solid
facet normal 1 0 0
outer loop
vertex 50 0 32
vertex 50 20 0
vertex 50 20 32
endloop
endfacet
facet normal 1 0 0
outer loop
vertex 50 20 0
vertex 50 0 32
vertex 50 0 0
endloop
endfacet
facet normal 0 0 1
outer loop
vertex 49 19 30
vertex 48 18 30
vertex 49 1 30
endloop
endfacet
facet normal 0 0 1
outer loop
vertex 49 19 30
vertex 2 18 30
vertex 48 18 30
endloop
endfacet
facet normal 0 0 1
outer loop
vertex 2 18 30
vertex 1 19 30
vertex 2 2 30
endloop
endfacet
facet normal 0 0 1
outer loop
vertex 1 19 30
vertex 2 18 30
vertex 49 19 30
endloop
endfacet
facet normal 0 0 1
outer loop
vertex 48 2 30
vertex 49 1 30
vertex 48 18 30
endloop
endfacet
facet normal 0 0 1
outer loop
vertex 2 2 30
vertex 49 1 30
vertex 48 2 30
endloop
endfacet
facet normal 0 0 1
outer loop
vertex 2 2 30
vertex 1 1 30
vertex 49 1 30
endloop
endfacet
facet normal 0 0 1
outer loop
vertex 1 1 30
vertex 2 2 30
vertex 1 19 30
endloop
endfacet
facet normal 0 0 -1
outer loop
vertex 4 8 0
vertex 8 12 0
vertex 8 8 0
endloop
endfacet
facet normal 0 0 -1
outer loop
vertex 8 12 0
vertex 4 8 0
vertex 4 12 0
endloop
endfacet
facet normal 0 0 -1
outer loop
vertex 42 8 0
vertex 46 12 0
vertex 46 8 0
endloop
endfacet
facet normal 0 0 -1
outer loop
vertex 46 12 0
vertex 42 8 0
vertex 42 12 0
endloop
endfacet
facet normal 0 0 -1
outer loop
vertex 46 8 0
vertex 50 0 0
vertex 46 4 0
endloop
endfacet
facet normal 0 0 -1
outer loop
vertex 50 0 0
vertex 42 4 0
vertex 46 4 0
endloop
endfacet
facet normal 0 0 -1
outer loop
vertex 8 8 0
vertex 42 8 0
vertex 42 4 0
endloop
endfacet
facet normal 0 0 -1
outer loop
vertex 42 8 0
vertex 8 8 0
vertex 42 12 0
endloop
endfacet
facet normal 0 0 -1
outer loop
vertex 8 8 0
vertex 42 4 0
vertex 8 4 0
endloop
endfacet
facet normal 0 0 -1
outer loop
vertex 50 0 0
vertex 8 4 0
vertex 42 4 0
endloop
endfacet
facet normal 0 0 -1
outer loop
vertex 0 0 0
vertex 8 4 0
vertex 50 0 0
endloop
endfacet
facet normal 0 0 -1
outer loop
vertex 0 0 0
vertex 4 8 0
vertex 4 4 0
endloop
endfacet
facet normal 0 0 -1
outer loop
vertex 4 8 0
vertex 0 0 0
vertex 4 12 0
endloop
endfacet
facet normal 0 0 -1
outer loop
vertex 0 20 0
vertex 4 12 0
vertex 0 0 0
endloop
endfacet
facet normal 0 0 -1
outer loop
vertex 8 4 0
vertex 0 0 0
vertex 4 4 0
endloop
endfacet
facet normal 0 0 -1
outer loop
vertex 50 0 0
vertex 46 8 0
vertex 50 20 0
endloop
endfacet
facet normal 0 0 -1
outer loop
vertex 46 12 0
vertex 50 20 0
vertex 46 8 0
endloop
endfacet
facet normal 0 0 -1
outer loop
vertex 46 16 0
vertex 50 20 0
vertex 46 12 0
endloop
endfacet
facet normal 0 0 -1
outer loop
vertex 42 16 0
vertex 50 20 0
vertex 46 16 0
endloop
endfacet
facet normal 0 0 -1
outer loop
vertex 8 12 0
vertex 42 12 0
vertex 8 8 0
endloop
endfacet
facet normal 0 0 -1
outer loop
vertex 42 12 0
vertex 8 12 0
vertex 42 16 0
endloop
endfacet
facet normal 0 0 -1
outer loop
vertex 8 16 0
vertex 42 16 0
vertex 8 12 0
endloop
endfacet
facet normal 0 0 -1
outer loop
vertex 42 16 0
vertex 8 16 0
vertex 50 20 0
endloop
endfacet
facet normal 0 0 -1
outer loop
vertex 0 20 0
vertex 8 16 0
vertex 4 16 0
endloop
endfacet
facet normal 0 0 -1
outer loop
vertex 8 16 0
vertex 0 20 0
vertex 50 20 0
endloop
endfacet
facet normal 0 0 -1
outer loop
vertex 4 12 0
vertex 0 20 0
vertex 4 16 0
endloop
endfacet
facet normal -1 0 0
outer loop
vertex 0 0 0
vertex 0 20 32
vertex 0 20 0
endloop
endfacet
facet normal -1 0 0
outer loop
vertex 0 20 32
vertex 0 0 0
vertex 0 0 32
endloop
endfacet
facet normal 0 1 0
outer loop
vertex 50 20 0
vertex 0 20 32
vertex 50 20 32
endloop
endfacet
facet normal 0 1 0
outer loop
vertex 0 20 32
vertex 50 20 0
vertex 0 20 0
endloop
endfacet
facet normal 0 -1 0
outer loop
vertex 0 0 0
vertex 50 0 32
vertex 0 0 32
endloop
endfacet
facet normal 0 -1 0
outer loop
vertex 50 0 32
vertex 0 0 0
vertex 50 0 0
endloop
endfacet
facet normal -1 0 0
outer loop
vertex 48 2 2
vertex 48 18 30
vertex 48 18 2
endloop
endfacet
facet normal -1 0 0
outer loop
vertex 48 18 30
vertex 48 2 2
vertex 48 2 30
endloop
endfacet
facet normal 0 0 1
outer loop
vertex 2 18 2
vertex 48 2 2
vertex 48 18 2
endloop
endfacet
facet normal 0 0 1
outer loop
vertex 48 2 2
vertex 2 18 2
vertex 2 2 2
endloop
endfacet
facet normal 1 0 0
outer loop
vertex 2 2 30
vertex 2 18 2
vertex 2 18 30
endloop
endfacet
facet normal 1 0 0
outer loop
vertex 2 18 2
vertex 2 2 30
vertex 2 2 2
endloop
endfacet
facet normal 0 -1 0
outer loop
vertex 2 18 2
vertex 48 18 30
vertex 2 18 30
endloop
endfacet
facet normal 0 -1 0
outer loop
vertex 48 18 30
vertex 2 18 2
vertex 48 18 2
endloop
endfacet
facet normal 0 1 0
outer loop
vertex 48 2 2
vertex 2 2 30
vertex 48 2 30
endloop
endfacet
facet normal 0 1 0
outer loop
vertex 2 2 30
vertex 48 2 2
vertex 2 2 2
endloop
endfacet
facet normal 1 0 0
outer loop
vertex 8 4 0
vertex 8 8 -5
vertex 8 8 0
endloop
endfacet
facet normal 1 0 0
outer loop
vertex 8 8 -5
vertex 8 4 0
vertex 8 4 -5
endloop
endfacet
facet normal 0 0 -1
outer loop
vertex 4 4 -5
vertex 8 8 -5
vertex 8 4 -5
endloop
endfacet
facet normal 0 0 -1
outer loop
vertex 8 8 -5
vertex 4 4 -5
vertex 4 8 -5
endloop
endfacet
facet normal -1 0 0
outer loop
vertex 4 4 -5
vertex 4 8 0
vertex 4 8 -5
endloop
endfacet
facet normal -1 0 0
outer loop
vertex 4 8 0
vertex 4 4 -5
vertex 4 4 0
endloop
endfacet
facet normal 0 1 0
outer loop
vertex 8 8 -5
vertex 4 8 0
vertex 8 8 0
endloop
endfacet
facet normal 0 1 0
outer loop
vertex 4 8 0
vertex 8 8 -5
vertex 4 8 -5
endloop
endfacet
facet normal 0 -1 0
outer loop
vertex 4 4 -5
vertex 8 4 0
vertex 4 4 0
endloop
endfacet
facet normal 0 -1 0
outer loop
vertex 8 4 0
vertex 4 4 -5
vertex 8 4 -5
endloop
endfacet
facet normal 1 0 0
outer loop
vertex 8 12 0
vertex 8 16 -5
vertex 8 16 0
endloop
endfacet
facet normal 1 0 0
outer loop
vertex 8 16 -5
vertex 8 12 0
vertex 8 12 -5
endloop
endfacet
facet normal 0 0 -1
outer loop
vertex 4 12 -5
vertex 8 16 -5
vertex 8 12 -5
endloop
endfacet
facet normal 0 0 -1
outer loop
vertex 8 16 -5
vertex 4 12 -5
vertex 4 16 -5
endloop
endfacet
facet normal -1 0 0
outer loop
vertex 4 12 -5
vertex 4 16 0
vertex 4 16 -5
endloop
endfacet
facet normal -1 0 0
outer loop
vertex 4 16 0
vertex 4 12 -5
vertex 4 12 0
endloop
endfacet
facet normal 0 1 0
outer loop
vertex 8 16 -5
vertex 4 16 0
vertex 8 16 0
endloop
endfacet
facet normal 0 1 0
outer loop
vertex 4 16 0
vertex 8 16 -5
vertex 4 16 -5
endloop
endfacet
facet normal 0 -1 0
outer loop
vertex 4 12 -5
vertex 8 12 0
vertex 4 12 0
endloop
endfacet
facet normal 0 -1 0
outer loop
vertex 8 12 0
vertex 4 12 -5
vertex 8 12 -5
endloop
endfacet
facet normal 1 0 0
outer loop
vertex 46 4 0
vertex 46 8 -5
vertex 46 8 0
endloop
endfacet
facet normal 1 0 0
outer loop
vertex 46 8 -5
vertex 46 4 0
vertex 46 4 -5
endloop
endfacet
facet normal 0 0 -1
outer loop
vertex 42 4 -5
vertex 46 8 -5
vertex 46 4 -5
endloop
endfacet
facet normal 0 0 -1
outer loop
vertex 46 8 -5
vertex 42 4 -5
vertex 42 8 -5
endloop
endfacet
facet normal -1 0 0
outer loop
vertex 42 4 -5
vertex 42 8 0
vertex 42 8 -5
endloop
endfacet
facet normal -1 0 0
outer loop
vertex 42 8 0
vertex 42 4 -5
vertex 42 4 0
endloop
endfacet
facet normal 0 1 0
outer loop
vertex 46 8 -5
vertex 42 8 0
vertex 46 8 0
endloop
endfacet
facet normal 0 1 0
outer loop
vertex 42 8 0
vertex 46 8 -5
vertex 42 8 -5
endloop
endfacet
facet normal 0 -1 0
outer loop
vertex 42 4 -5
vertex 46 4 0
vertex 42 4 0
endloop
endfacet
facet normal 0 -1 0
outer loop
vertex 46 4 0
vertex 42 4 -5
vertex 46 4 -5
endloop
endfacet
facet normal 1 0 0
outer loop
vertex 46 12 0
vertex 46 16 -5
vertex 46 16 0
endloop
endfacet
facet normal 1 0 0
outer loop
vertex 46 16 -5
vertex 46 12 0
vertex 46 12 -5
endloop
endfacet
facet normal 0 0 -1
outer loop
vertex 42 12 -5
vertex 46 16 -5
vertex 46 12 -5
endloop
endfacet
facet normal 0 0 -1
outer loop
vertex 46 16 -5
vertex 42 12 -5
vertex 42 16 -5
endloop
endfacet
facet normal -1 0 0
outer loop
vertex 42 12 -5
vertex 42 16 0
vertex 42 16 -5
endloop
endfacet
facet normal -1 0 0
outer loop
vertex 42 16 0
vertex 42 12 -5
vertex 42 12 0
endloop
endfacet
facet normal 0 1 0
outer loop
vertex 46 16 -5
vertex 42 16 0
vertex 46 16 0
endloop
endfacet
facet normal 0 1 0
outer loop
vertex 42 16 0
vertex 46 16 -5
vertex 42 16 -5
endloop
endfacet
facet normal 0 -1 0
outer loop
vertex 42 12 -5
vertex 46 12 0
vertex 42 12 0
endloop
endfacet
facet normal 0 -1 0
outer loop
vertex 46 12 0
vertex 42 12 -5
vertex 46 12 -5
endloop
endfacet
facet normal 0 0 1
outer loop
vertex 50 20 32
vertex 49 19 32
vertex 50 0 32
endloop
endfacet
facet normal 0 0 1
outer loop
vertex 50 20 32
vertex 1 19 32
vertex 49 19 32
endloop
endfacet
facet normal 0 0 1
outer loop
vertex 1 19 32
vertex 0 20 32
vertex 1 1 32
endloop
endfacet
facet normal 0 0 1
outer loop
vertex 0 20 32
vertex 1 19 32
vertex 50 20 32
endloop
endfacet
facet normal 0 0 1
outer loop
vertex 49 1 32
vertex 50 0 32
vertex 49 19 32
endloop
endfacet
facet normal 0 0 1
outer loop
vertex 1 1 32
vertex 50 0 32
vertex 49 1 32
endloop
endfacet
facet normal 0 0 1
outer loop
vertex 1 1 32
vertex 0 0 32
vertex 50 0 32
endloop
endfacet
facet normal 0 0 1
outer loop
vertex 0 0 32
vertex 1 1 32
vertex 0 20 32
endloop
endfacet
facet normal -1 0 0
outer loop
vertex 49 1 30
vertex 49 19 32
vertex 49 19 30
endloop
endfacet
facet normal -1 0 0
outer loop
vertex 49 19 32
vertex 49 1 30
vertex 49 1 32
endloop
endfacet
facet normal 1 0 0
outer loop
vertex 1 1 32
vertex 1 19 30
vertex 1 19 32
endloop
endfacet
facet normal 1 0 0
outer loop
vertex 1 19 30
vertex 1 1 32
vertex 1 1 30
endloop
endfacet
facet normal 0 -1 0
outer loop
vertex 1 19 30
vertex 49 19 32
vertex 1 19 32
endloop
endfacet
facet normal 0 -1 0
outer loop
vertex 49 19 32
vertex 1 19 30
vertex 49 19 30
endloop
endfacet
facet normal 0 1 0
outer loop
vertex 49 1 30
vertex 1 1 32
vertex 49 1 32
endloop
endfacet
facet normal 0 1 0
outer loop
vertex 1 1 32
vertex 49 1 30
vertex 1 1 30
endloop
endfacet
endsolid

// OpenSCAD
// Colored Box Example
// Demonstrates color parameter support in OpenSCAD Assistive Forge

/* [Dimensions] */
width = 50; // [10:100] Box width (mm)
height = 30; // [10:100] Box height (mm)
depth = 20; // [10:100] Box depth (mm)
wall_thickness = 2; // [1:0.5:5] Wall thickness (mm)

/* [Appearance] */
box_color = "FF6B35"; // [color] Primary box color
accent_color = "004E89"; // [color] Accent color for details
use_colors = "yes"; // [yes, no] Use colors in preview

/* [Details] */
add_lid = "yes"; // [yes, no] Add a lid
add_feet = "yes"; // [yes, no] Add feet to bottom

// Module: Colored Box
// This demonstrates how color parameters work in OpenSCAD Assistive Forge
// Colors are passed as RGB arrays [r, g, b] with values 0-255

module colored_box() {
    difference() {
        // Outer box
        if (use_colors == "yes") {
            color(box_color / 255)  // Convert RGB array to 0-1 range
            cube([width, depth, height]);
        } else {
            cube([width, depth, height]);
        }
        
        // Hollow interior
        translate([wall_thickness, wall_thickness, wall_thickness])
        cube([
            width - 2 * wall_thickness, 
            depth - 2 * wall_thickness, 
            height
        ]);
    }
    
    // Add feet if enabled
    if (add_feet == "yes") {
        foot_size = wall_thickness * 2;
        foot_height = 5;
        
        if (use_colors == "yes") {
            color(accent_color / 255)  // Accent color for feet
            for (x = [foot_size, width - foot_size * 2]) {
                for (y = [foot_size, depth - foot_size * 2]) {
                    translate([x, y, -foot_height])
                    cube([foot_size, foot_size, foot_height]);
                }
            }
        } else {
            for (x = [foot_size, width - foot_size * 2]) {
                for (y = [foot_size, depth - foot_size * 2]) {
                    translate([x, y, -foot_height])
                    cube([foot_size, foot_size, foot_height]);
                }
            }
        }
    }
    
    // Add lid if enabled
    if (add_lid == "yes") {
        lid_overlap = wall_thickness / 2;
        
        if (use_colors == "yes") {
            color(accent_color / 255)  // Accent color for lid
            translate([0, 0, height])
            difference() {
                cube([width, depth, wall_thickness]);
                translate([lid_overlap, lid_overlap, -1])
                cube([
                    width - 2 * lid_overlap, 
                    depth - 2 * lid_overlap, 
                    wall_thickness + 2
                ]);
            }
        } else {
            translate([0, 0, height])
            difference() {
                cube([width, depth, wall_thickness]);
                translate([lid_overlap, lid_overlap, -1])
                cube([
                    width - 2 * lid_overlap, 
                    depth - 2 * lid_overlap, 
                    wall_thickness + 2
                ]);
            }
        }
    }
}

// Render the box
colored_box();

// Instructions:
// 1. Click the color boxes to select your preferred colors
// 2. Or enter hex codes directly (RRGGBB format)
// 3. Adjust dimensions using the sliders
// 4. Toggle features with yes/no switches
// 5. Click "Generate STL" to create your customized box
